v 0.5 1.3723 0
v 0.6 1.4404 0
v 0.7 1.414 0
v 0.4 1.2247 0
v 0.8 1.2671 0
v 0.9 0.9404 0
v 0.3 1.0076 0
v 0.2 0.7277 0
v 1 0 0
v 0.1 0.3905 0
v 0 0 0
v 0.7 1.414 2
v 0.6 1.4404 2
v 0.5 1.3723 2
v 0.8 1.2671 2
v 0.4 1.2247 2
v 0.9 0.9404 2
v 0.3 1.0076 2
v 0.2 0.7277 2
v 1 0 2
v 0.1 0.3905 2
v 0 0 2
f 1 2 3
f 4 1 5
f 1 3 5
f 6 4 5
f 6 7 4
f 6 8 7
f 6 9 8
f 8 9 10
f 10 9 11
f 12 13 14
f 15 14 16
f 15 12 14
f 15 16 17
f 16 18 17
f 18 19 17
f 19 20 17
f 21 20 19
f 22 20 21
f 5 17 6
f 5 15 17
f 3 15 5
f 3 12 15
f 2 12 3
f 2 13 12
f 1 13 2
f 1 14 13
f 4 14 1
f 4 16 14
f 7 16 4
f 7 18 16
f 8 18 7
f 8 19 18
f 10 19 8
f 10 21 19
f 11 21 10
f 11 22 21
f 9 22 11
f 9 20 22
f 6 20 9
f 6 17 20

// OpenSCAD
/*
module thing() {
    translate([-75, -40, 0])
        difference() {
            cube([145,115, 50]);
            linear_extrude(50)
                import (file = "outfile.dxf");
        }
}

difference() {
    scale([1.1, 1.1, 1])
        thing();
    thing();
}
    */
    
points = [
[0.0, 0.0],
[0.1, 0.39051600363758093],
[0.2, 0.7277417964166458],
[0.30000000000000004, 1.007565780558227],
[0.4, 1.2247404795688746],
[0.5, 1.37228822720381],
[0.6000000000000001, 1.4403915860577619],
[0.7000000000000001, 1.4140479075055532],
[0.8, 1.2670720616092885],
[0.9, 0.9404502799571866],
[1, 0]
];
linear_extrude(2)
    polygon(points);
